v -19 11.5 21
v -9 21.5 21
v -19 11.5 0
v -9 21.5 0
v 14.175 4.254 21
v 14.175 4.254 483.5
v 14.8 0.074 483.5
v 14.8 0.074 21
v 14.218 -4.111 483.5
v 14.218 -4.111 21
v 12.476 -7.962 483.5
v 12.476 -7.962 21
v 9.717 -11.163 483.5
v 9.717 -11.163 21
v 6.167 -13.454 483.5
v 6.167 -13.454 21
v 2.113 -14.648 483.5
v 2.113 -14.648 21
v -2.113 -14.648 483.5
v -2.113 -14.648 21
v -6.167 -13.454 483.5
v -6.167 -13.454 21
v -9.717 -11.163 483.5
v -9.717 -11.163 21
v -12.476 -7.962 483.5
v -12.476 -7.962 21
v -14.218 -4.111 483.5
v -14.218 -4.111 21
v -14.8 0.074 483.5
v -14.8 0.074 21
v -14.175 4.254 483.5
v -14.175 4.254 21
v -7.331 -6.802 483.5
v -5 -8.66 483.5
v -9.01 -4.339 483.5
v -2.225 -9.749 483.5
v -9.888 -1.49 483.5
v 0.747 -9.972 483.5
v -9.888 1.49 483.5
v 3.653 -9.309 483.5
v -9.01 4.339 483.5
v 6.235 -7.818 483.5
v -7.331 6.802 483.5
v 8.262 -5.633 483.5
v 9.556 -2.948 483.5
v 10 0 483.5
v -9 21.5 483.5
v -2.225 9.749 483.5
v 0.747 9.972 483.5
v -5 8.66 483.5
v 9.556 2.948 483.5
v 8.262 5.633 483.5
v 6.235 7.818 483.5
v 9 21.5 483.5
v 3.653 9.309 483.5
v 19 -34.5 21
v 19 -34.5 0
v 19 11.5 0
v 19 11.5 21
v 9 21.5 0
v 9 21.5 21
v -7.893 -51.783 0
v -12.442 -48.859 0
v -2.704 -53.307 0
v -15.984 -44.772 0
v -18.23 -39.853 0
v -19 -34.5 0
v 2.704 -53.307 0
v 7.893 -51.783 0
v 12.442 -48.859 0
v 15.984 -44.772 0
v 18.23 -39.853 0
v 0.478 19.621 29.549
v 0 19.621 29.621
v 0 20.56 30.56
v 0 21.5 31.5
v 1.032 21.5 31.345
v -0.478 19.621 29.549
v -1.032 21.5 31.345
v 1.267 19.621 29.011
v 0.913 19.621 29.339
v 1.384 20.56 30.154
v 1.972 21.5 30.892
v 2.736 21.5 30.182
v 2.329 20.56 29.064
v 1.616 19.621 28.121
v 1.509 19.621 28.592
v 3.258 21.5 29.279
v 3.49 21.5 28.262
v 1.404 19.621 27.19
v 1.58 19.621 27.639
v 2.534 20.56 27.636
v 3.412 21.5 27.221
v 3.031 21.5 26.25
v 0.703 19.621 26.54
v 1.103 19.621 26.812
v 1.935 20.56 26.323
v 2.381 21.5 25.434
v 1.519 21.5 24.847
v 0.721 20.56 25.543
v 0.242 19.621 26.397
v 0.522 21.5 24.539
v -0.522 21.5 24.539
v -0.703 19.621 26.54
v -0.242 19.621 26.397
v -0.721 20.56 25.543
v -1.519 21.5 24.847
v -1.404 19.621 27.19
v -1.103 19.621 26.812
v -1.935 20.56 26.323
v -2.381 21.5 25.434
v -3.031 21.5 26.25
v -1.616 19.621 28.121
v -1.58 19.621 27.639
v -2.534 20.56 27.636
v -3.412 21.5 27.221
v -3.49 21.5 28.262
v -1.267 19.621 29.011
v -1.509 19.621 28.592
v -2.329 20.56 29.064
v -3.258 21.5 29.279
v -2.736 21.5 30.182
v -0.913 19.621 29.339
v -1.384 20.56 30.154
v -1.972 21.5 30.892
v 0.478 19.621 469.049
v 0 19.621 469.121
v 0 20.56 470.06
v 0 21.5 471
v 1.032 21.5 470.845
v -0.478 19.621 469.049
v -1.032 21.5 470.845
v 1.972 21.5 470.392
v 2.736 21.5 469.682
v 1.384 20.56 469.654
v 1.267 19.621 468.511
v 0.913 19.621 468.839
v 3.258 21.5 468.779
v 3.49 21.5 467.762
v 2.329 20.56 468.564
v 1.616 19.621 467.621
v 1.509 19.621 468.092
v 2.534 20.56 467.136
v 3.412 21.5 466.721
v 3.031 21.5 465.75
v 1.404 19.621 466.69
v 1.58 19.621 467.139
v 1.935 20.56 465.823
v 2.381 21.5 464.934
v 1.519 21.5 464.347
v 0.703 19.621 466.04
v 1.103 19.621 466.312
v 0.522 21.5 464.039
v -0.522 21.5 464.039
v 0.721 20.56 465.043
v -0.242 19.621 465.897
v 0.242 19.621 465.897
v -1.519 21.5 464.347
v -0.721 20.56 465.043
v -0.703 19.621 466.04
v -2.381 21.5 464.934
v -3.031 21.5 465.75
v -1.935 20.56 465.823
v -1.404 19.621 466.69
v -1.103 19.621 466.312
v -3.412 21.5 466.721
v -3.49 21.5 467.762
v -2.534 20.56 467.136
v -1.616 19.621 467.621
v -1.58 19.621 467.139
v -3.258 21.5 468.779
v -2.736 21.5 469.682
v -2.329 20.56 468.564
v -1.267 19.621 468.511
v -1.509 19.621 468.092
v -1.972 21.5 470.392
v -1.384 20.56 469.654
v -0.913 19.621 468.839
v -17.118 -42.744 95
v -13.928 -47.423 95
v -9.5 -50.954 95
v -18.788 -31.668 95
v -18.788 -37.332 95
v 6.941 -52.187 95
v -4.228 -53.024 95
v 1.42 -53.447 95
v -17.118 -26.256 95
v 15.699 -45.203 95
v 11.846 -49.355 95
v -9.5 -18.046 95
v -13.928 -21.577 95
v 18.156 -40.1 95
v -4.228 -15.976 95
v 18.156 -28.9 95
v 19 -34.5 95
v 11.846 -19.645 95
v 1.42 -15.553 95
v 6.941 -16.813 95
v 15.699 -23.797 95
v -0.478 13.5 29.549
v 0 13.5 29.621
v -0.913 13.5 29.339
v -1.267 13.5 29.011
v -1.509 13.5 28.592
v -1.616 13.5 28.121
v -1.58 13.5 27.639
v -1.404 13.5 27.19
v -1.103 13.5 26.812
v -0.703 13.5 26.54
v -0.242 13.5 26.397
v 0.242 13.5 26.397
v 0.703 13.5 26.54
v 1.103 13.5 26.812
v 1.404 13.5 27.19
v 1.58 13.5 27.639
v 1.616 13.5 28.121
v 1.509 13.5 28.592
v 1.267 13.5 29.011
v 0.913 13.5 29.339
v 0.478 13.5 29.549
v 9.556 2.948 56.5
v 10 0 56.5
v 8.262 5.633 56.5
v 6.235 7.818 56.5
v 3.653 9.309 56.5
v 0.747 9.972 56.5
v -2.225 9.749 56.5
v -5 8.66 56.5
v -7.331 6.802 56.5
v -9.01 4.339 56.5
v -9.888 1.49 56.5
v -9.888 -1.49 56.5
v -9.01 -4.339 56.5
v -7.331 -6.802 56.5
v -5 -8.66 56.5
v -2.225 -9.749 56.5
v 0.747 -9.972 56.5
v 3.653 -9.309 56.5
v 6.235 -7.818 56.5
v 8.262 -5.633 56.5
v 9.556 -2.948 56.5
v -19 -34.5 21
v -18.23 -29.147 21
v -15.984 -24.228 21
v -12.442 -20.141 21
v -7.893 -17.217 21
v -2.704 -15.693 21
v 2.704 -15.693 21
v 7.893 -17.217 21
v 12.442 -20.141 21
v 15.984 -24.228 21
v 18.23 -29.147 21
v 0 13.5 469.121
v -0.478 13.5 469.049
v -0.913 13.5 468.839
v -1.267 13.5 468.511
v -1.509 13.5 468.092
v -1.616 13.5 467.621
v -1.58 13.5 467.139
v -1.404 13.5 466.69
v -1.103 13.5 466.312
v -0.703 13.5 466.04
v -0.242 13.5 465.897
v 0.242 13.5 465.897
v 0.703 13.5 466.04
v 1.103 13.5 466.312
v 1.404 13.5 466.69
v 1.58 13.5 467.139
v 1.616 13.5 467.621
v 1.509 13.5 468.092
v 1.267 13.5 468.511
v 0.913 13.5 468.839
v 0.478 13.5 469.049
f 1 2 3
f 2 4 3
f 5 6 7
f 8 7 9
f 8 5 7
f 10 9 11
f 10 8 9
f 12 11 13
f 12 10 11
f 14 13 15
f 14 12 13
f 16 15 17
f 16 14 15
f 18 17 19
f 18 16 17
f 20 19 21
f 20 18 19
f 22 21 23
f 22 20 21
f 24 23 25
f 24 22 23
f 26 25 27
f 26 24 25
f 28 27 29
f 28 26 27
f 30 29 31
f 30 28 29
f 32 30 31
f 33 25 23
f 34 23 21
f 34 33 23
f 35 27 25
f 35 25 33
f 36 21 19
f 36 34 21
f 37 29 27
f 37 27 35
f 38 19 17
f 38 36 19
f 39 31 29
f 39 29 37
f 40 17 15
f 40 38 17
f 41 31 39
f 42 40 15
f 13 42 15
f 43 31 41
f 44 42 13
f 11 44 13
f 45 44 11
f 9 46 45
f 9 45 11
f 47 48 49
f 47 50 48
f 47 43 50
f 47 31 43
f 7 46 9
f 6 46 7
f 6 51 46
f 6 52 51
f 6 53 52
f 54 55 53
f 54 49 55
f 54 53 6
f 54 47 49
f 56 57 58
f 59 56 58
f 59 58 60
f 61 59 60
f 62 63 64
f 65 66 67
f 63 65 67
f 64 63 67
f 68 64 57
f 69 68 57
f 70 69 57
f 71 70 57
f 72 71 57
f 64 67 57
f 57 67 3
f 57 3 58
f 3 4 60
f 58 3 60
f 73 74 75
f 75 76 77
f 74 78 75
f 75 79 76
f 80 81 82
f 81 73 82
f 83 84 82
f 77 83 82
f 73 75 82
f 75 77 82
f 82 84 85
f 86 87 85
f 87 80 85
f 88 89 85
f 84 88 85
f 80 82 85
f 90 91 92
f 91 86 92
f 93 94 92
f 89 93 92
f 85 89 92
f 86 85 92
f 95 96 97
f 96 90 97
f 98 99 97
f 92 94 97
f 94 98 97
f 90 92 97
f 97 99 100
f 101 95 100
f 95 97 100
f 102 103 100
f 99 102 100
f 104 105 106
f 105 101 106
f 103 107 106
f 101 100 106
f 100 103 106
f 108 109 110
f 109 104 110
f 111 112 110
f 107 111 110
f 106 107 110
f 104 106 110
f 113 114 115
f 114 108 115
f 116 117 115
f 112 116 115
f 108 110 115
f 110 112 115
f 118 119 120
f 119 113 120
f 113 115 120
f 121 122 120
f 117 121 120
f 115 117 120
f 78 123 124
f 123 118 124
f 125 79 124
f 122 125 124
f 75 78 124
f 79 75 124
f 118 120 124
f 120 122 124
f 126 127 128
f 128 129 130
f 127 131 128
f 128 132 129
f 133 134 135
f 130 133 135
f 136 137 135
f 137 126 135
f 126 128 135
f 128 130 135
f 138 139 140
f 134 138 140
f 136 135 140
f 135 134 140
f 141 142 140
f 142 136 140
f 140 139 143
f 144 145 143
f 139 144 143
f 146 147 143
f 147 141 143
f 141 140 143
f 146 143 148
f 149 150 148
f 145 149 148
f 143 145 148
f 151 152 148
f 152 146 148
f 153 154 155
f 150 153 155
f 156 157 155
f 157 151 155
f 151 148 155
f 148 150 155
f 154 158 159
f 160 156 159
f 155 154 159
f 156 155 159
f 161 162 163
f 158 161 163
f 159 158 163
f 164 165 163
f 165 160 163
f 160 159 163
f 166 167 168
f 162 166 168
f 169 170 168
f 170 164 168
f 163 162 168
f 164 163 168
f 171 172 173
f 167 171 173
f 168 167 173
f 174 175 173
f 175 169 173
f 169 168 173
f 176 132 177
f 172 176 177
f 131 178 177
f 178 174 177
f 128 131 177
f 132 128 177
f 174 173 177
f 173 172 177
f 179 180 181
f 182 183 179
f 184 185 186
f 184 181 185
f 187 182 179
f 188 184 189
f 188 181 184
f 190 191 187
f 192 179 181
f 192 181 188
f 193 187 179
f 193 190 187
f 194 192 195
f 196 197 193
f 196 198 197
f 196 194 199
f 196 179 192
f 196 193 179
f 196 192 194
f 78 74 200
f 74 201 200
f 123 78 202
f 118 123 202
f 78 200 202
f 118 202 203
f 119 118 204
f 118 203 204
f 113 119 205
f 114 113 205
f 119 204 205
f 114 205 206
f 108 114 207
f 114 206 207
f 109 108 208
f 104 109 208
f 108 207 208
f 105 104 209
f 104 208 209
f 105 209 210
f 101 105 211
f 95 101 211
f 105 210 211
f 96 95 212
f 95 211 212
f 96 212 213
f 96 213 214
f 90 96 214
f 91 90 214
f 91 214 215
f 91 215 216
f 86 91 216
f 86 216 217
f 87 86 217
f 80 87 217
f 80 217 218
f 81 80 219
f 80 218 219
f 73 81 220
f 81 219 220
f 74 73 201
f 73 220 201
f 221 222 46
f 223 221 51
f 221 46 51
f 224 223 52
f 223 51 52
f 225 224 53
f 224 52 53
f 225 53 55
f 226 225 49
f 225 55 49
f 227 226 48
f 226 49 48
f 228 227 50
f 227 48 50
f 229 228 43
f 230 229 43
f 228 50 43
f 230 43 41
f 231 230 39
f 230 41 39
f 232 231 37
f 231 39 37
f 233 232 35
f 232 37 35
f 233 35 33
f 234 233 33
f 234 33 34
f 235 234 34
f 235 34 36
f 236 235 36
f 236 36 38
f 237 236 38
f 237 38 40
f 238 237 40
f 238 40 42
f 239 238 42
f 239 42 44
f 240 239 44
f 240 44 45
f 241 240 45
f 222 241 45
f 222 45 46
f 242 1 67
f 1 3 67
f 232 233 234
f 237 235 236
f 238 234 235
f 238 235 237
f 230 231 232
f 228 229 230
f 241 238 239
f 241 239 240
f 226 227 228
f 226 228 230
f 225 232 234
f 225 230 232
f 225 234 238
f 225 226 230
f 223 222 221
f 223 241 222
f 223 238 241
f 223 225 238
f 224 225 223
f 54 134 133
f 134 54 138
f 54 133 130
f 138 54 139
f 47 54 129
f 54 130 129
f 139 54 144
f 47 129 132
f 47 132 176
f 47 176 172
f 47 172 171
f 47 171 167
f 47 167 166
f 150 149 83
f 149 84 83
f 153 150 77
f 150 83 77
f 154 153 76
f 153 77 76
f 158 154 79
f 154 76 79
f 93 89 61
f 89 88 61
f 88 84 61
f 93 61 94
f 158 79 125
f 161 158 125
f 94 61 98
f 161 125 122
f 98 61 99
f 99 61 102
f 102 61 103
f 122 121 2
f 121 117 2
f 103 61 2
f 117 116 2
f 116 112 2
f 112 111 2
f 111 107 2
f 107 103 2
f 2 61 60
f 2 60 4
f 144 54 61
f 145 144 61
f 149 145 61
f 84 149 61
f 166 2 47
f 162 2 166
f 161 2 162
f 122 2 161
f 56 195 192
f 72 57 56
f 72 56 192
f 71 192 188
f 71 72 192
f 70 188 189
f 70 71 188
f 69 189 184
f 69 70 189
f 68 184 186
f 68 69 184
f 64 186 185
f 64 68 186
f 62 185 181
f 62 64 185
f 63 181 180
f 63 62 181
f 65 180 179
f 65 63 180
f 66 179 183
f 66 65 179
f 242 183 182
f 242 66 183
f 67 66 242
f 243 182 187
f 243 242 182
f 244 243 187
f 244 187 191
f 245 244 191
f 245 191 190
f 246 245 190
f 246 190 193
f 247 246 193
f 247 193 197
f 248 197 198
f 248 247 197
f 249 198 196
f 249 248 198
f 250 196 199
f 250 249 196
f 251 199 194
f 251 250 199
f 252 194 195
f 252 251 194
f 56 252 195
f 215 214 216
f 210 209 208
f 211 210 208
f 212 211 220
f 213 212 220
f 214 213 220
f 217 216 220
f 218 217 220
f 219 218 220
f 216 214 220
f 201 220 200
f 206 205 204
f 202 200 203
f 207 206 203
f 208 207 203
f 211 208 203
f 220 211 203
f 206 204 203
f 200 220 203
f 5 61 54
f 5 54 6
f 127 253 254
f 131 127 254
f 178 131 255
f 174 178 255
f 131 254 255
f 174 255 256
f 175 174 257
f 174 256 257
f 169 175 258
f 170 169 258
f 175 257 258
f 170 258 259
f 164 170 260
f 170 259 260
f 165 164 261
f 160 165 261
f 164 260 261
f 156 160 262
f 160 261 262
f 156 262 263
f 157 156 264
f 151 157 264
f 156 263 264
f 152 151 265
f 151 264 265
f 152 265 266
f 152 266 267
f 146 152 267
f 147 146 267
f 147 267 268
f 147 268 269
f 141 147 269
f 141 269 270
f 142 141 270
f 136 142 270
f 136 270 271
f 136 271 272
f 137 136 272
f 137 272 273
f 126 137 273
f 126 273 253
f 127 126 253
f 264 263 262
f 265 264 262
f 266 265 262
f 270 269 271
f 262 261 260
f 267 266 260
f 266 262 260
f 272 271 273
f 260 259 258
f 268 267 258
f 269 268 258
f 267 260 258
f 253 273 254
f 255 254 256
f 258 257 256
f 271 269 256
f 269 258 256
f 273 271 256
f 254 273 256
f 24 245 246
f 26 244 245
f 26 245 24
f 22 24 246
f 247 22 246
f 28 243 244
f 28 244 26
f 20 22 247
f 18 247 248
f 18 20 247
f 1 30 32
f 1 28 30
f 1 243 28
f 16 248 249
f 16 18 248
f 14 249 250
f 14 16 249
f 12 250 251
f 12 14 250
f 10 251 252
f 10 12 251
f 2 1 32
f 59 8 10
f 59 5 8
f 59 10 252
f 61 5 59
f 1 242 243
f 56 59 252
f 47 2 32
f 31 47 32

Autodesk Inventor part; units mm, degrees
ref_plane "YZ Plane" through (0, 0, 0) normal (1, 0, 0) x (0, 1, 0)
ref_plane "XZ Plane" through (0, 0, 0) normal (0, 1, 0) x (-1, 0, 0)
ref_plane "XY Plane" through (0, 0, 0) normal (0, 0, 1) x (1, 0, 0)
sketch "Sketch1" plane through (0, 0, 0) normal (0, 0, 1) x (1, 0, 0)
  circle A0 centre (0, 0) radius 14.8
  line L0 (-9, 21.5) -> (9, 21.5)
  line L1 (-9, 21.5) -> (-19, 11.5)
  line L2 (-19, 11.5) -> (-19, -34.776357)
  circle A1 centre (0, -34.5) radius 19
  line L3 (0, 21.5) -> (0, -34.5) construction
  line L4 (9, 21.5) -> (19, 11.5)
  line L5 (19, 11.5) -> (19, -34.776357)
  point P0 (-19, -34.5)
  point P1 (19, -34.5)
  dimension "d0" = 29.6
  dimension "d1" = 18
  dimension "d2" = 21.5
  dimension "d3" = 38
  dimension "d4" = 56
  dimension "d5" = 45
sketch "Sketch1 outline for Extrusion1" plane through (0, 0, 0) normal (0, 0, 1) x (1, 0, 0)
  line L0 (19, 11.5) -> (9, 21.5)
  line L1 (19, -34.5) -> (19, 11.5)
  arc A0 (-19, -34.5) -> (19, -34.5) centre (0, -34.5) ccw
  line L2 (-19, 11.5) -> (-19, -34.5)
  line L3 (-9, 21.5) -> (-19, 11.5)
  line L4 (9, 21.5) -> (-9, 21.5)
extrude "Extrusion1" add sketch "Sketch1 outline for Extrusion1" along normal blind 21
sketch "Sketch2" plane through (0, 0, 21) normal (0, 0, 1) x (1, 0, 0)
  line L0 (9, 21.5) -> (-9, 21.5)
  circle A0 centre (0, 0) radius 14.8
  line L1 (-9, 21.5) -> (-14.175455, 4.253996)
  line L2 (9, 21.5) -> (14.175455, 4.253996)
  line L3 (9, 21.5) -> (-9, 21.5)
  line L4 (-9, 21.5) -> (9, 21.5)
  dimension "d8" = 29.6
extrude "Extrusion2" add sketch "Sketch2" along normal blind 462.5
sketch "Sketch3" plane through (0, 0, 21) normal (0, 0, 1) x (1, 0, 0)
  arc A0 (-19, -34.5) -> (19, -34.5) centre (0, -34.5) ccw projected
  circle A1 centre (0, -34.5) radius 19
  point P0 (0, 0)
  point P1 (19, -34.5)
  point P2 (-19, -34.5)
extrude "Extrusion3" add sketch "Sketch3" along normal blind 74
sketch "Sketch4" plane through (-9, 21.5, 0) normal (0, 1, 0) x (1, 0, 0)
  line L0 (18, 0) -> (0, 0) projected
  line L1 (0, 0) -> (0, -21) projected
  line L2 (0, -21) -> (0, -483.5) projected
  line L3 (18, -483.5) -> (0, -483.5) projected
  line L4 (18, -21) -> (18, -483.5) projected
  line L5 (18, 0) -> (18, -21) projected
  line L6 (-16, -473) -> (34, -473)
  point P0 (9, 0)
  point P1 (9, -473)
  point P2 (9, -483.5)
  dimension "d13" = 50
  dimension "d14" = 10.5
split_face "Split1"
sketch "Sketch5" plane through (0, 0, 483.5) normal (0, 0, 1) x (1, 0, 0)
  circle A0 centre (0, 0) radius 10
  dimension "d15" = 20
extrude "Extrusion4" cut sketch "Sketch5" against normal blind 427
sketch "Sketch6" plane through (-9, 21.5, 0) normal (0, 1, 0) x (1, 0, 0)
  line L0 (18, -473) -> (0, -473) projected
  line L1 (18, -21) -> (18, -473) projected
  line L2 (18, 0) -> (18, -21) projected
  line L3 (18, 0) -> (0, 0) projected
  line L4 (0, 0) -> (0, -21) projected
  line L5 (0, -21) -> (0, -473) projected
  line L6 (18, -473) -> (0, -473) projected
  line L7 (0, -473) -> (0, -483.5) projected
  line L8 (18, -483.5) -> (0, -483.5) projected
  line L9 (18, -473) -> (18, -483.5) projected
  point P0 (9, 0)
  point P1 (9, -467.5)
  point P2 (9, -28)
  point P3 (9, 0)
  point P4 (9, -483.5)
  dimension "d18" = 28
  dimension "d19" = 16
hole "Hole1" at (0, 21.5, 467.5) at (0, 21.5, 28) direction (0, -1, 0) diameter 3.242 depth 8 countersink diameter 7 countersink angle 90 thread size "M4x0.7" class "6H" standard "ISO Metric profile"
properties part number "Linear Motor (T-Frame)" material "Aluminum 6061"
